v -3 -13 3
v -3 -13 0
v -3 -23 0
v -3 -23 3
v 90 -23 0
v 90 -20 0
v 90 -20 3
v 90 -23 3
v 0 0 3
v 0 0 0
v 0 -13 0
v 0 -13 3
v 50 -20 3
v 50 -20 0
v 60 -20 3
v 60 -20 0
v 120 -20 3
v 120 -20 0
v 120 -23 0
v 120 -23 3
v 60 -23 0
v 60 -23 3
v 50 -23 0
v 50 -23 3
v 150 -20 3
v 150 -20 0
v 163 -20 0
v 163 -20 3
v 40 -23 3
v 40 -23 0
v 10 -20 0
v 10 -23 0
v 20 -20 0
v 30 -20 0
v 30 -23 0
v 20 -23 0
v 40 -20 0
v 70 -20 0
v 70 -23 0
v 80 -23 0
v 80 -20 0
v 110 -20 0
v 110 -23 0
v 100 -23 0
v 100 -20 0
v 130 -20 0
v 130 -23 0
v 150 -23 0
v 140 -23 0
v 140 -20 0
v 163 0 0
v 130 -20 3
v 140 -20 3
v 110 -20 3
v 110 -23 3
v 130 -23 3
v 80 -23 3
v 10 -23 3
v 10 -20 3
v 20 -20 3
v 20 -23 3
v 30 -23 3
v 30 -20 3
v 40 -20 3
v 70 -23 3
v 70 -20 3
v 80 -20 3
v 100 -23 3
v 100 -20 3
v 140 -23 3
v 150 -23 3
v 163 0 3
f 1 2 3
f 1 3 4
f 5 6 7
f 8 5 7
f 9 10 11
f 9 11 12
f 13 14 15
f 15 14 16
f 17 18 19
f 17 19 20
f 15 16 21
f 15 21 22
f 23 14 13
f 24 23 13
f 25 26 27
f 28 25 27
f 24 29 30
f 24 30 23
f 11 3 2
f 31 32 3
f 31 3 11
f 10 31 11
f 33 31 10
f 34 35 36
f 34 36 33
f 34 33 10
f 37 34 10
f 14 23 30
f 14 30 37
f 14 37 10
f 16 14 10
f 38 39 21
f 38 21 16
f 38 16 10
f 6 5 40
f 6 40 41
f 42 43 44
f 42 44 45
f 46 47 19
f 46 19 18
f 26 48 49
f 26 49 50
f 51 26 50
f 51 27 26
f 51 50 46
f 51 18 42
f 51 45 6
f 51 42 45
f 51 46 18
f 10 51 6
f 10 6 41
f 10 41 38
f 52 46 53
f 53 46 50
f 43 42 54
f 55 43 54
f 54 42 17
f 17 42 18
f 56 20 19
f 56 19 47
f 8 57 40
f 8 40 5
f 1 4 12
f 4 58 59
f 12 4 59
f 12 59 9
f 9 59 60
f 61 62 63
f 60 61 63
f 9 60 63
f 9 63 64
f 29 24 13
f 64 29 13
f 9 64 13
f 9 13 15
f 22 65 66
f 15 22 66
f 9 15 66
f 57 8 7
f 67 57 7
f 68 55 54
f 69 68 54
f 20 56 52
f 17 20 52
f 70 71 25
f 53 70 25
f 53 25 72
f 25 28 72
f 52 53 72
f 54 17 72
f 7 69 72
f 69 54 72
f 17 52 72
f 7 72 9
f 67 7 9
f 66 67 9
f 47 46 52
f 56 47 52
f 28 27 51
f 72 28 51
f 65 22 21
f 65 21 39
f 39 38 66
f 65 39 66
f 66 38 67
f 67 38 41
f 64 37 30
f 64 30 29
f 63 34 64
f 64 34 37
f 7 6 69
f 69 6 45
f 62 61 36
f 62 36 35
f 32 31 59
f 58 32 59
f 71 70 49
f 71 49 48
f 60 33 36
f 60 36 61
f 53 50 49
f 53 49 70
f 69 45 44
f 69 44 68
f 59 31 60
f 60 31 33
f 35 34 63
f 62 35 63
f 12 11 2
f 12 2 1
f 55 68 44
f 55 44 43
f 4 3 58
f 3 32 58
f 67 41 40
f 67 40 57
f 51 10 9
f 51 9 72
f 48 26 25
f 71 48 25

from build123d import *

# Parameters (mm, degrees)
ESQUISSE1_W                = 163
ESQUISSE1_H                = 20
BOSS_EXTRU_1_DEPTH         = 3
ESQUISSE2_W                = 10
ESQUISSE2_H                = 3
BOSS_EXTRU_2_DEPTH         = 3
R_P_TITION_LIN_AIRE1_COUNT = 8
R_P_TITION_LIN_AIRE1_PITCH = 20
ESQUISSE3_W                = 3
ESQUISSE3_H                = 10
BOSS_EXTRU_3_DEPTH         = 3


with BuildPart() as part:
    # Esquisse1 → Boss.-Extru.1 (new body)
    with BuildSketch(Plane.XY):
        with Locations((81.5, -10)):
            Rectangle(ESQUISSE1_W, ESQUISSE1_H)
    extrude(amount=BOSS_EXTRU_1_DEPTH)

    # Esquisse2 → Boss.-Extru.2 (add)
    with BuildSketch(Plane.XZ.offset(20)):
        with Locations((5, 1.5)):
            Rectangle(ESQUISSE2_W, ESQUISSE2_H)
    boss_extru_2 = extrude(amount=BOSS_EXTRU_2_DEPTH)

    # Répétition linéaire1: Boss.-Extru.2 ×8
    with Locations(*[(i * R_P_TITION_LIN_AIRE1_PITCH, 0, 0) for i in range(1, R_P_TITION_LIN_AIRE1_COUNT)]):
        add(boss_extru_2)

    # Esquisse3 → Boss.-Extru.3 (add)
    with BuildSketch(Plane.ZY):
        with Locations((1.5, -18)):
            Rectangle(ESQUISSE3_W, ESQUISSE3_H)
    extrude(amount=BOSS_EXTRU_3_DEPTH)


solid = part.part
